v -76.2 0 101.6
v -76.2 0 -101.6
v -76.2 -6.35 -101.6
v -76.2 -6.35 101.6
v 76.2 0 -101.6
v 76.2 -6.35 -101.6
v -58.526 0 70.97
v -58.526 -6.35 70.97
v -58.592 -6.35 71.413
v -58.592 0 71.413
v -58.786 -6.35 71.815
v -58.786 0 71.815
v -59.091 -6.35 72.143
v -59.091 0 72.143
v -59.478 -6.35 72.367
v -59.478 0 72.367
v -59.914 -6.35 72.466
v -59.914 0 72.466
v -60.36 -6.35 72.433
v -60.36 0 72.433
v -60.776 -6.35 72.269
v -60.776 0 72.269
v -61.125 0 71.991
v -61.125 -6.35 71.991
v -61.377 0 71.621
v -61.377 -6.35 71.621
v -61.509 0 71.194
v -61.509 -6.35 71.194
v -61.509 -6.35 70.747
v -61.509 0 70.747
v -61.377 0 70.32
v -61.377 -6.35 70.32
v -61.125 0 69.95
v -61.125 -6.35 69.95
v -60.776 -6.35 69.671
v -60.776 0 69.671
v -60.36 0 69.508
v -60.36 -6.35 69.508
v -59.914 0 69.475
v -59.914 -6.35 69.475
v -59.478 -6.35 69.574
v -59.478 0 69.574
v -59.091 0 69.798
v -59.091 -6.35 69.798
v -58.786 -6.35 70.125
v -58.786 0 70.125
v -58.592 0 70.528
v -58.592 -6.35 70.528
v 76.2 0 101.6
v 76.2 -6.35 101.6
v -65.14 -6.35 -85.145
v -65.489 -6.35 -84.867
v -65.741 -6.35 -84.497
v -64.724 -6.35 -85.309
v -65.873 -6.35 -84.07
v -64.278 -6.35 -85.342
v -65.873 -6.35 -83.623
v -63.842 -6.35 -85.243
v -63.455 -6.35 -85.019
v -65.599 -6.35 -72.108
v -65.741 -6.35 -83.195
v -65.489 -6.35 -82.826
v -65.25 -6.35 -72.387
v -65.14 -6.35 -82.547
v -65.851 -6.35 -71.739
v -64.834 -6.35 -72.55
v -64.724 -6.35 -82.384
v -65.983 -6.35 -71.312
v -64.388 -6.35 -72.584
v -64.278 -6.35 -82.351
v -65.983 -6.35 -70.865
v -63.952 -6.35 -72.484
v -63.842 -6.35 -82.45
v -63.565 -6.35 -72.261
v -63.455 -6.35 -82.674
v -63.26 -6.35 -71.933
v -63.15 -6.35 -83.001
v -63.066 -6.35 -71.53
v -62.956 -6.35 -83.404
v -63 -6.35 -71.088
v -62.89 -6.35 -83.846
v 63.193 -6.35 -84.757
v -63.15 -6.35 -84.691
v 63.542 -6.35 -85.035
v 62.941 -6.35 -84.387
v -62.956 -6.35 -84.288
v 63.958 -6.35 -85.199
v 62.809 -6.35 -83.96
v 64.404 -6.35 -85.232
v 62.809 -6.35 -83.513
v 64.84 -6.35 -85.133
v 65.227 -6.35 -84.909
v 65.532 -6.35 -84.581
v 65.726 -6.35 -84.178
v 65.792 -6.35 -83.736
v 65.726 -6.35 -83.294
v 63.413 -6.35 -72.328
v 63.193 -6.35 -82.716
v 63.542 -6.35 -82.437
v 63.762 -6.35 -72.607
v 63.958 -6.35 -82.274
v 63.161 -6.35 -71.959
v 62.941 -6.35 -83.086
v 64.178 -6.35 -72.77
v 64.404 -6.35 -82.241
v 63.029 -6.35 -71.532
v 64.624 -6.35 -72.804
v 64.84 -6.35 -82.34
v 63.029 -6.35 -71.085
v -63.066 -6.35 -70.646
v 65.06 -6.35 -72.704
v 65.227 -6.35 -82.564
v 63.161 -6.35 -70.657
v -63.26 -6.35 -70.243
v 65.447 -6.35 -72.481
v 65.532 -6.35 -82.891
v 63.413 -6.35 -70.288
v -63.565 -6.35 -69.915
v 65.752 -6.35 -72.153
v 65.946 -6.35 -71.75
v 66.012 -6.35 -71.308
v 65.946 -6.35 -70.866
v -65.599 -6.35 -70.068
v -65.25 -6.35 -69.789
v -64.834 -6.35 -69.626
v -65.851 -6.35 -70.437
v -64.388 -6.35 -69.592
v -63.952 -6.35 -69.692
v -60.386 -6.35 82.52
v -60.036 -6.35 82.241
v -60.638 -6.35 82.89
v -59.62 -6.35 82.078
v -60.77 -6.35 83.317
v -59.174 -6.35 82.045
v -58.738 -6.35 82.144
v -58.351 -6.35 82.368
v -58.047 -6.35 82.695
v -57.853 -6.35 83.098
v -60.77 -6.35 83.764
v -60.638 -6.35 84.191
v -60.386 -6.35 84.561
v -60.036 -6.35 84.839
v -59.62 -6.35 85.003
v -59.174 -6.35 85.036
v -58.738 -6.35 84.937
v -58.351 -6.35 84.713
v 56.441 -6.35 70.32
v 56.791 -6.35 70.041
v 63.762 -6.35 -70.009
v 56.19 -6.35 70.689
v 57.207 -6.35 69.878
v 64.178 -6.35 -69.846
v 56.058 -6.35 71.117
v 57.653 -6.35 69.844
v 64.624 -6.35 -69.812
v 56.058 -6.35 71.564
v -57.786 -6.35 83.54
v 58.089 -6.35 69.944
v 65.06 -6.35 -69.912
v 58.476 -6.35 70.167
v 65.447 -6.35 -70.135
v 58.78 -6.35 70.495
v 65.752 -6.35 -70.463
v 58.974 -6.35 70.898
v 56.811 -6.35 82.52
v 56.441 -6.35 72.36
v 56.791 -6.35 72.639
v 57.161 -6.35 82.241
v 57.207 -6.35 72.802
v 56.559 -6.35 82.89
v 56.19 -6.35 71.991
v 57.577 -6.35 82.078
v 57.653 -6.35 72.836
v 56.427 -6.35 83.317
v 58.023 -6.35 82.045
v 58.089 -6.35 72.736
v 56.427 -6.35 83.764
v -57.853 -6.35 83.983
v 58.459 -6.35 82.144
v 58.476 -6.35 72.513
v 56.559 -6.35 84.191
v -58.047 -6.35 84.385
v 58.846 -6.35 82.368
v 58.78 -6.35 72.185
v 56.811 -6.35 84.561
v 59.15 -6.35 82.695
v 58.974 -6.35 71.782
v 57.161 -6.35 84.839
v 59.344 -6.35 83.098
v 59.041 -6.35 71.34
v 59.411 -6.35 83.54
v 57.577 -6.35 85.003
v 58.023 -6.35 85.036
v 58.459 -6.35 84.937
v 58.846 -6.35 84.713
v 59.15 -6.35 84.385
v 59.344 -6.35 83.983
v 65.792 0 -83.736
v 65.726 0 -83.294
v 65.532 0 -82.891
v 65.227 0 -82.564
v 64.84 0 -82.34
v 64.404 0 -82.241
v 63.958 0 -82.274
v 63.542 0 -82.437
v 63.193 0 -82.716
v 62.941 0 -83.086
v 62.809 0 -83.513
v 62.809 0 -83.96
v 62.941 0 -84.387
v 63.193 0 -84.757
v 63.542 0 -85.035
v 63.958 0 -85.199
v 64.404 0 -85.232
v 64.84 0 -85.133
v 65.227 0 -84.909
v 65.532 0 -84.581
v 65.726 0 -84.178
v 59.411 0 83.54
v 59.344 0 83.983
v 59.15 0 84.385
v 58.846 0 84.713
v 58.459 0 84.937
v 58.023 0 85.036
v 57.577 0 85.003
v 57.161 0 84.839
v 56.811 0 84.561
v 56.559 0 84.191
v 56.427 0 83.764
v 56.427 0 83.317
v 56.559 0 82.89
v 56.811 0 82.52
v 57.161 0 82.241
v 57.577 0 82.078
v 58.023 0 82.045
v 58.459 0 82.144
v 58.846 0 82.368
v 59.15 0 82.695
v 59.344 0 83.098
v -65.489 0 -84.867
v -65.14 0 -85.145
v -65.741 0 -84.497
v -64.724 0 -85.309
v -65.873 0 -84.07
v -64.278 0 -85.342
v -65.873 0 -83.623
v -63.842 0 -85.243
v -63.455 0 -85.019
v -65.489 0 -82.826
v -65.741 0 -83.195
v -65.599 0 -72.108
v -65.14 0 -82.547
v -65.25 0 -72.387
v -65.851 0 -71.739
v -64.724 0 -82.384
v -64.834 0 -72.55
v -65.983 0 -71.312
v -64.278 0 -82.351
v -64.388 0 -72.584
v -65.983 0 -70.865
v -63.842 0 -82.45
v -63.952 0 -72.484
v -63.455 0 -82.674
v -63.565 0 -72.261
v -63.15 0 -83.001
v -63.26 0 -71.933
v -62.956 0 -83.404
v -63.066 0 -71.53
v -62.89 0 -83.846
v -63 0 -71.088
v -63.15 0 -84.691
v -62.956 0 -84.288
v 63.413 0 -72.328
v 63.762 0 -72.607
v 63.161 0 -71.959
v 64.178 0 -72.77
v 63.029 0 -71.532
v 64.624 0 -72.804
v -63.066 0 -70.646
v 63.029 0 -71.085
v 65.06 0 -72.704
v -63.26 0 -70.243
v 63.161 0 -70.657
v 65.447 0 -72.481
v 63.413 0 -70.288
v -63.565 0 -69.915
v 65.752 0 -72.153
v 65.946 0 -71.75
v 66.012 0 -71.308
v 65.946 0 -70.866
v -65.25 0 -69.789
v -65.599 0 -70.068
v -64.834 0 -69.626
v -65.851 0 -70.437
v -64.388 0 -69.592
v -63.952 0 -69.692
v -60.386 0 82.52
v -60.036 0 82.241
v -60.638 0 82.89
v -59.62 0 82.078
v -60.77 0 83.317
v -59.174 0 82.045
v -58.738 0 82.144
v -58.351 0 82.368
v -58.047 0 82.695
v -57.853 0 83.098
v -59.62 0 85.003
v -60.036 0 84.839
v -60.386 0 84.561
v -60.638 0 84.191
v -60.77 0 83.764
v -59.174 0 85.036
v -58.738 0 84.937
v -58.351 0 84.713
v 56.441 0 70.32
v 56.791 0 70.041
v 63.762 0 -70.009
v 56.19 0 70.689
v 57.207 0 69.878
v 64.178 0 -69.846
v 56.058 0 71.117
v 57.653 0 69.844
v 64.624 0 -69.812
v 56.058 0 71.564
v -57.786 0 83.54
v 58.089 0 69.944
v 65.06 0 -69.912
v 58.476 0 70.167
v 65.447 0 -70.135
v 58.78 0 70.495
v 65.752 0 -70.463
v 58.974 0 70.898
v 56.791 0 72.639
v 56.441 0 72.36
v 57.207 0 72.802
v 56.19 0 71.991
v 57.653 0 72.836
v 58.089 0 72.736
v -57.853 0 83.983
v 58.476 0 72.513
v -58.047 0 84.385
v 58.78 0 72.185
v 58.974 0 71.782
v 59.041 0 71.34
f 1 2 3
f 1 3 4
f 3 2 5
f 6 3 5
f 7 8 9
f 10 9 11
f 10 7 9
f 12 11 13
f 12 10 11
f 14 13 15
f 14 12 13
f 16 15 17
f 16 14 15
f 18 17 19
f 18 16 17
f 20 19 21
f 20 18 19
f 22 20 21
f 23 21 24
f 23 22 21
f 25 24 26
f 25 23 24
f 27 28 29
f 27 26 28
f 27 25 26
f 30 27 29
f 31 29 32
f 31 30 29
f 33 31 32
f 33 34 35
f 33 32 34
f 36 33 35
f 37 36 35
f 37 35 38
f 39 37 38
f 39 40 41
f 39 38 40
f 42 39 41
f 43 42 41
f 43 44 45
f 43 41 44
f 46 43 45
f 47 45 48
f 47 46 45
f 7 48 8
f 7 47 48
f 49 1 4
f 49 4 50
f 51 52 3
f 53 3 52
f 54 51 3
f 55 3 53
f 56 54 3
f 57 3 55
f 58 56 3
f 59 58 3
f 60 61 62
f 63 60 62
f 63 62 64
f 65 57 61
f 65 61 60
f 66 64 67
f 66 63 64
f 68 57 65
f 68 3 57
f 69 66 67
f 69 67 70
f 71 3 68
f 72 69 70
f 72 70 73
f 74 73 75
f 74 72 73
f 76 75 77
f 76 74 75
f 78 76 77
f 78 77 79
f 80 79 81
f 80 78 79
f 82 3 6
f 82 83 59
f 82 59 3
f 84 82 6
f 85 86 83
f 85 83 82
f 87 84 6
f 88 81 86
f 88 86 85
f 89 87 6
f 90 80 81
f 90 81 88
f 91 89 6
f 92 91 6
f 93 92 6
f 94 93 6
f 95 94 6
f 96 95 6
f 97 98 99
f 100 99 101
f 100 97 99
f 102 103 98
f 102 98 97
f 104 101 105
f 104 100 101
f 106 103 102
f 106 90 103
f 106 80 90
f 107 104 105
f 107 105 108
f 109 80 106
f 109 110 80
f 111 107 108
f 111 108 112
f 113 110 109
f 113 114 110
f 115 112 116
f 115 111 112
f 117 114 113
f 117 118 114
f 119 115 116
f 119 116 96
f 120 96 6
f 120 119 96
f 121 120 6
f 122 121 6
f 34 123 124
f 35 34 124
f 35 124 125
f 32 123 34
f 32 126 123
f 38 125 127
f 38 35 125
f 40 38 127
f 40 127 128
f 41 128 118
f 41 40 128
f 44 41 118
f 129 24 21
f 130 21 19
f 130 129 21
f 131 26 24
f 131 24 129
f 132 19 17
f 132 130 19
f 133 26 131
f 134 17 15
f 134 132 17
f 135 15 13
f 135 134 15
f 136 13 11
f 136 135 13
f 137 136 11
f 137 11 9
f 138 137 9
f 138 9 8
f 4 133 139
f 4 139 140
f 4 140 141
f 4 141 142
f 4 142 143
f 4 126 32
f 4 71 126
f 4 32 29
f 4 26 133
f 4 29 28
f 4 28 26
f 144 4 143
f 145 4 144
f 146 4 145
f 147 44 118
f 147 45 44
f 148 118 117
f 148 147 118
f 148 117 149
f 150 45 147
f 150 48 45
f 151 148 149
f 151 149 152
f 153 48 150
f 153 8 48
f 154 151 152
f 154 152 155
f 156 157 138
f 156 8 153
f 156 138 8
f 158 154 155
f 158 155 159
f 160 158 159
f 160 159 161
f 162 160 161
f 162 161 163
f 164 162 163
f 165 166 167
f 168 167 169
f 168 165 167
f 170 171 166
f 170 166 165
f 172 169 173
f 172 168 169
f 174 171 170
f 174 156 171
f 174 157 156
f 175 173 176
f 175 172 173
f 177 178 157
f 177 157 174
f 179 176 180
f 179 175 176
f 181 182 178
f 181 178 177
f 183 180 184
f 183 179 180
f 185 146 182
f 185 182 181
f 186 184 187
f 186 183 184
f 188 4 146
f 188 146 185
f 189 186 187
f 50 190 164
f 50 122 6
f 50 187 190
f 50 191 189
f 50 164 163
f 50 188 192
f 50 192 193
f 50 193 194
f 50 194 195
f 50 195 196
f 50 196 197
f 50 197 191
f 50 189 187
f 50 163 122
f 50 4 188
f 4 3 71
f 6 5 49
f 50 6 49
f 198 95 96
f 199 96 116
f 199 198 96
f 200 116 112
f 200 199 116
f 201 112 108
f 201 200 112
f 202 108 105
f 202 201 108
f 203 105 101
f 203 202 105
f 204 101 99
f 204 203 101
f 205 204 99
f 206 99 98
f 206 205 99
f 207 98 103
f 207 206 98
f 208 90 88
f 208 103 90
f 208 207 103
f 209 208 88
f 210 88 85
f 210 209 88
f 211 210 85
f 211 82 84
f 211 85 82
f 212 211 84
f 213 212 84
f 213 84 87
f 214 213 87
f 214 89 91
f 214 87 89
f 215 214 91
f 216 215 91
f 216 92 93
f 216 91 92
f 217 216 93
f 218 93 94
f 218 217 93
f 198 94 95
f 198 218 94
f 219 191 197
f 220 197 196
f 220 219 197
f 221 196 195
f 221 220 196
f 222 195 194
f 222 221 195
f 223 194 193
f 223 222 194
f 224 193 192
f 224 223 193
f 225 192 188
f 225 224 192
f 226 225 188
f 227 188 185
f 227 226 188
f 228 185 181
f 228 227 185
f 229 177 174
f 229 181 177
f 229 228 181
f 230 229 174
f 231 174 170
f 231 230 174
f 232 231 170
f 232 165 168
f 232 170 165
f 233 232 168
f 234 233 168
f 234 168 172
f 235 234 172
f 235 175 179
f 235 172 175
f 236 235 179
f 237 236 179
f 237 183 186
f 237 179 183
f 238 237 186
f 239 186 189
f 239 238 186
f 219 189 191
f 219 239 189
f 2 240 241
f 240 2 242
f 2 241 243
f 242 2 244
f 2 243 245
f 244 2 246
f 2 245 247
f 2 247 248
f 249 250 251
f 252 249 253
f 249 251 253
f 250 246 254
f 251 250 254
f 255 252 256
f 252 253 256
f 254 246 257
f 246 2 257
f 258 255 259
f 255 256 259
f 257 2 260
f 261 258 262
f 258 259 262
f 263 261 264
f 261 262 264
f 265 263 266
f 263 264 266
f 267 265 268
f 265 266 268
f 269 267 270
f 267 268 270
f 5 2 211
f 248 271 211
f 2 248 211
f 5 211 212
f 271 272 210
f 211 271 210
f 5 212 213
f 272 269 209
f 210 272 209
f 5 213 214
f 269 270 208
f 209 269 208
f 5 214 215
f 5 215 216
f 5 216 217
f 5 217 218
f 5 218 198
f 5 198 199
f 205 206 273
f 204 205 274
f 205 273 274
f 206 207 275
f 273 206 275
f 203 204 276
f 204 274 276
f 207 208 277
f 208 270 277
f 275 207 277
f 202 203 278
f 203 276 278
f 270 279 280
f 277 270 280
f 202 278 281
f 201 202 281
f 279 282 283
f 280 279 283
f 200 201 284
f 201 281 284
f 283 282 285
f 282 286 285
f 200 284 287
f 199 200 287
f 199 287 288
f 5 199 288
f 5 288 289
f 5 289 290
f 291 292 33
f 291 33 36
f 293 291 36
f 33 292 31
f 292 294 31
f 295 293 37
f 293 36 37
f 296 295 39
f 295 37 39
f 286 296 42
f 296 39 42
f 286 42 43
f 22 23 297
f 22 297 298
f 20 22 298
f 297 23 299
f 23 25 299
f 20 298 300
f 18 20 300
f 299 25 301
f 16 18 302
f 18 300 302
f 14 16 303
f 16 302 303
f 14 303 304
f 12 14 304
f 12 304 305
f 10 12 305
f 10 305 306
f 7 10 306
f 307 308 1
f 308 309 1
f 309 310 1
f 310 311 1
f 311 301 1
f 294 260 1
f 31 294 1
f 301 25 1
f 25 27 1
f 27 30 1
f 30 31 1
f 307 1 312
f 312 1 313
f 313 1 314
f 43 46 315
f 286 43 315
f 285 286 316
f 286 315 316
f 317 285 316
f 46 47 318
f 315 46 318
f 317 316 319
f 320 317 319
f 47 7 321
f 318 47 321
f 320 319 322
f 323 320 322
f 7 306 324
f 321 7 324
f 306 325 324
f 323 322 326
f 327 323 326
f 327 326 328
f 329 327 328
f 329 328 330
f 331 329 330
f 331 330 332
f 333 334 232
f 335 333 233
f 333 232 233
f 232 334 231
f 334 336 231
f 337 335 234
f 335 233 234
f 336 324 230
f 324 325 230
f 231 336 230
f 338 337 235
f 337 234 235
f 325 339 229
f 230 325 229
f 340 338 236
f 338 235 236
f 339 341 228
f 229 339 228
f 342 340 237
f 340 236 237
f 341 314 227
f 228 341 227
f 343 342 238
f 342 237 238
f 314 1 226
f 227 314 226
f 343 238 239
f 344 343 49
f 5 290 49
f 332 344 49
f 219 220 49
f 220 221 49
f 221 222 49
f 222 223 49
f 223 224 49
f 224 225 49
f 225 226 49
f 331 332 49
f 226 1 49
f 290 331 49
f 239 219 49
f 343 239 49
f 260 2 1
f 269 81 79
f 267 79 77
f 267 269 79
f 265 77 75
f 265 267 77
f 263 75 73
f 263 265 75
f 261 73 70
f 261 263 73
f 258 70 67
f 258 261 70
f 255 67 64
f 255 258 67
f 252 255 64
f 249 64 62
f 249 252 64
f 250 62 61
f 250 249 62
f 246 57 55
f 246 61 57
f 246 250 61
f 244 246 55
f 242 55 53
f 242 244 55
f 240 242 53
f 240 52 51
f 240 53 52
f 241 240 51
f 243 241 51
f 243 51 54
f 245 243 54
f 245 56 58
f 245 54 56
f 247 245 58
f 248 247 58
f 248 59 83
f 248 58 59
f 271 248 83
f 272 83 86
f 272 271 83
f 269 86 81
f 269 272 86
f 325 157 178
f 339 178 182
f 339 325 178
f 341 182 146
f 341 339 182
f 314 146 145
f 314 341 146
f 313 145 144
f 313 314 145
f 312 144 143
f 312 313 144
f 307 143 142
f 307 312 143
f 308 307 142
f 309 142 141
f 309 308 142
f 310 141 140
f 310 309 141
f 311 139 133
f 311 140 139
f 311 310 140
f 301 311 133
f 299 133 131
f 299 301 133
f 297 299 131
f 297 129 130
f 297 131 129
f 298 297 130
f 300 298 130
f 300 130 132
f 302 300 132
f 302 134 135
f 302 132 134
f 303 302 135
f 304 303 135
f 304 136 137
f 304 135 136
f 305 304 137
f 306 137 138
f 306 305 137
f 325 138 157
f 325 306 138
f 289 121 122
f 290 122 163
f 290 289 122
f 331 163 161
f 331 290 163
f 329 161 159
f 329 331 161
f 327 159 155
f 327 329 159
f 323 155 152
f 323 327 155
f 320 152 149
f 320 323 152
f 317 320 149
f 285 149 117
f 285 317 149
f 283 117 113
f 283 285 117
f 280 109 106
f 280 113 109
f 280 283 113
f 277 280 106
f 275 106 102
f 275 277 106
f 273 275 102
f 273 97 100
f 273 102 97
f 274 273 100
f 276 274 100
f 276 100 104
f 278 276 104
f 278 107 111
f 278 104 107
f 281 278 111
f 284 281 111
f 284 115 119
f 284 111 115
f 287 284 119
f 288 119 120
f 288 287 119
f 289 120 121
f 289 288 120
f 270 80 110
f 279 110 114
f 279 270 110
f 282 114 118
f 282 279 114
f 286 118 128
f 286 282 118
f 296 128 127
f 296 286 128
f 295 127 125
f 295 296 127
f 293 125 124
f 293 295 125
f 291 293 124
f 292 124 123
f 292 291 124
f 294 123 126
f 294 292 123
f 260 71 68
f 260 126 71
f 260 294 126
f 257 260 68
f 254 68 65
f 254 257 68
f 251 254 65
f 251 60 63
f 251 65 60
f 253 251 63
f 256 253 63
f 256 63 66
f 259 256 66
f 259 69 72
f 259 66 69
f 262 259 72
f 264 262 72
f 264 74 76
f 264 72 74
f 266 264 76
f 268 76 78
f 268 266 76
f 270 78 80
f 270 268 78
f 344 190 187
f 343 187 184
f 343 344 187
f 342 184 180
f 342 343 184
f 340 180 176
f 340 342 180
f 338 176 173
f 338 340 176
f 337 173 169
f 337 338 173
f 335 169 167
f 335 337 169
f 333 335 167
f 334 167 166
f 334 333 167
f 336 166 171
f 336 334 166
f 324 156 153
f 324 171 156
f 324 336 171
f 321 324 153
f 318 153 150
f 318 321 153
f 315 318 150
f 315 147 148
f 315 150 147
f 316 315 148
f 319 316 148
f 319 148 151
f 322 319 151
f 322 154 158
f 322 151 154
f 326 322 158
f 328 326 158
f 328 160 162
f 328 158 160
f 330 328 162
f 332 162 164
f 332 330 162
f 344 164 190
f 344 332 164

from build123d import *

# Parameters (mm, degrees)
F0_W     = 152.4
F0_H     = 203.2
F1_DEPTH = 6.35
F2_R     = 1.5
F3_DEPTH = 25.4
F4_DEPTH = 25.4
F5_DEPTH = 73.66
F6_DEPTH = 25.4
F7_R     = 1.5
F8_DEPTH = 25.4


with BuildPart() as f1:
    # F0 (on Front) → F1 (new body)
    with BuildSketch(Plane.XZ):
        Rectangle(F0_W, F0_H)
    extrude(amount=F1_DEPTH)

    # F2 (on Front) → F3 (cut)
    with BuildSketch(Plane.XZ):
        with Locations((-59.286408, 83.54041)):
            Circle(F2_R)
        with Locations((-60.025822, 70.970371)):
            Circle(F2_R)
        with Locations((57.910688, 83.54041)):
            Circle(F2_R)
        with Locations((57.540983, 71.340077)):
            Circle(F2_R)
    extrude(amount=-F3_DEPTH, mode=Mode.SUBTRACT)

    # F2 (on Front) → F4 (cut)
    with BuildSketch(Plane.XZ):
        with Locations((-59.286408, 83.54041)):
            Circle(F2_R)
        with Locations((-60.025822, 70.970371)):
            Circle(F2_R)
        with Locations((57.910688, 83.54041)):
            Circle(F2_R)
        with Locations((57.540983, 71.340077)):
            Circle(F2_R)
    extrude(amount=-F4_DEPTH, mode=Mode.SUBTRACT)

    # F2 (on Front) → F5 (cut)
    with BuildSketch(Plane.XZ):
        with Locations((-59.286408, 83.54041)):
            Circle(F2_R)
        with Locations((-60.025822, 70.970371)):
            Circle(F2_R)
        with Locations((57.910688, 83.54041)):
            Circle(F2_R)
        with Locations((57.540983, 71.340077)):
            Circle(F2_R)
    extrude(amount=-F5_DEPTH, mode=Mode.SUBTRACT)

    # F2 (on Front) → F6 (cut)
    with BuildSketch(Plane.XZ):
        with Locations((-59.286408, 83.54041)):
            Circle(F2_R)
        with Locations((-60.025822, 70.970371)):
            Circle(F2_R)
        with Locations((57.910688, 83.54041)):
            Circle(F2_R)
        with Locations((57.540983, 71.340077)):
            Circle(F2_R)
    extrude(amount=F6_DEPTH, mode=Mode.SUBTRACT)

    # F7 (on Front) → F8 (cut)
    with BuildSketch(Plane.XZ):
        with Locations((64.29223, -83.736338)):
            Circle(F7_R)
        with Locations((64.512201, -71.308076)):
            Circle(F7_R)
        with Locations((-64.389788, -83.846323)):
            Circle(F7_R)
        with Locations((-64.499773, -71.088105)):
            Circle(F7_R)
    extrude(amount=F8_DEPTH, mode=Mode.SUBTRACT)


solid = f1.part
